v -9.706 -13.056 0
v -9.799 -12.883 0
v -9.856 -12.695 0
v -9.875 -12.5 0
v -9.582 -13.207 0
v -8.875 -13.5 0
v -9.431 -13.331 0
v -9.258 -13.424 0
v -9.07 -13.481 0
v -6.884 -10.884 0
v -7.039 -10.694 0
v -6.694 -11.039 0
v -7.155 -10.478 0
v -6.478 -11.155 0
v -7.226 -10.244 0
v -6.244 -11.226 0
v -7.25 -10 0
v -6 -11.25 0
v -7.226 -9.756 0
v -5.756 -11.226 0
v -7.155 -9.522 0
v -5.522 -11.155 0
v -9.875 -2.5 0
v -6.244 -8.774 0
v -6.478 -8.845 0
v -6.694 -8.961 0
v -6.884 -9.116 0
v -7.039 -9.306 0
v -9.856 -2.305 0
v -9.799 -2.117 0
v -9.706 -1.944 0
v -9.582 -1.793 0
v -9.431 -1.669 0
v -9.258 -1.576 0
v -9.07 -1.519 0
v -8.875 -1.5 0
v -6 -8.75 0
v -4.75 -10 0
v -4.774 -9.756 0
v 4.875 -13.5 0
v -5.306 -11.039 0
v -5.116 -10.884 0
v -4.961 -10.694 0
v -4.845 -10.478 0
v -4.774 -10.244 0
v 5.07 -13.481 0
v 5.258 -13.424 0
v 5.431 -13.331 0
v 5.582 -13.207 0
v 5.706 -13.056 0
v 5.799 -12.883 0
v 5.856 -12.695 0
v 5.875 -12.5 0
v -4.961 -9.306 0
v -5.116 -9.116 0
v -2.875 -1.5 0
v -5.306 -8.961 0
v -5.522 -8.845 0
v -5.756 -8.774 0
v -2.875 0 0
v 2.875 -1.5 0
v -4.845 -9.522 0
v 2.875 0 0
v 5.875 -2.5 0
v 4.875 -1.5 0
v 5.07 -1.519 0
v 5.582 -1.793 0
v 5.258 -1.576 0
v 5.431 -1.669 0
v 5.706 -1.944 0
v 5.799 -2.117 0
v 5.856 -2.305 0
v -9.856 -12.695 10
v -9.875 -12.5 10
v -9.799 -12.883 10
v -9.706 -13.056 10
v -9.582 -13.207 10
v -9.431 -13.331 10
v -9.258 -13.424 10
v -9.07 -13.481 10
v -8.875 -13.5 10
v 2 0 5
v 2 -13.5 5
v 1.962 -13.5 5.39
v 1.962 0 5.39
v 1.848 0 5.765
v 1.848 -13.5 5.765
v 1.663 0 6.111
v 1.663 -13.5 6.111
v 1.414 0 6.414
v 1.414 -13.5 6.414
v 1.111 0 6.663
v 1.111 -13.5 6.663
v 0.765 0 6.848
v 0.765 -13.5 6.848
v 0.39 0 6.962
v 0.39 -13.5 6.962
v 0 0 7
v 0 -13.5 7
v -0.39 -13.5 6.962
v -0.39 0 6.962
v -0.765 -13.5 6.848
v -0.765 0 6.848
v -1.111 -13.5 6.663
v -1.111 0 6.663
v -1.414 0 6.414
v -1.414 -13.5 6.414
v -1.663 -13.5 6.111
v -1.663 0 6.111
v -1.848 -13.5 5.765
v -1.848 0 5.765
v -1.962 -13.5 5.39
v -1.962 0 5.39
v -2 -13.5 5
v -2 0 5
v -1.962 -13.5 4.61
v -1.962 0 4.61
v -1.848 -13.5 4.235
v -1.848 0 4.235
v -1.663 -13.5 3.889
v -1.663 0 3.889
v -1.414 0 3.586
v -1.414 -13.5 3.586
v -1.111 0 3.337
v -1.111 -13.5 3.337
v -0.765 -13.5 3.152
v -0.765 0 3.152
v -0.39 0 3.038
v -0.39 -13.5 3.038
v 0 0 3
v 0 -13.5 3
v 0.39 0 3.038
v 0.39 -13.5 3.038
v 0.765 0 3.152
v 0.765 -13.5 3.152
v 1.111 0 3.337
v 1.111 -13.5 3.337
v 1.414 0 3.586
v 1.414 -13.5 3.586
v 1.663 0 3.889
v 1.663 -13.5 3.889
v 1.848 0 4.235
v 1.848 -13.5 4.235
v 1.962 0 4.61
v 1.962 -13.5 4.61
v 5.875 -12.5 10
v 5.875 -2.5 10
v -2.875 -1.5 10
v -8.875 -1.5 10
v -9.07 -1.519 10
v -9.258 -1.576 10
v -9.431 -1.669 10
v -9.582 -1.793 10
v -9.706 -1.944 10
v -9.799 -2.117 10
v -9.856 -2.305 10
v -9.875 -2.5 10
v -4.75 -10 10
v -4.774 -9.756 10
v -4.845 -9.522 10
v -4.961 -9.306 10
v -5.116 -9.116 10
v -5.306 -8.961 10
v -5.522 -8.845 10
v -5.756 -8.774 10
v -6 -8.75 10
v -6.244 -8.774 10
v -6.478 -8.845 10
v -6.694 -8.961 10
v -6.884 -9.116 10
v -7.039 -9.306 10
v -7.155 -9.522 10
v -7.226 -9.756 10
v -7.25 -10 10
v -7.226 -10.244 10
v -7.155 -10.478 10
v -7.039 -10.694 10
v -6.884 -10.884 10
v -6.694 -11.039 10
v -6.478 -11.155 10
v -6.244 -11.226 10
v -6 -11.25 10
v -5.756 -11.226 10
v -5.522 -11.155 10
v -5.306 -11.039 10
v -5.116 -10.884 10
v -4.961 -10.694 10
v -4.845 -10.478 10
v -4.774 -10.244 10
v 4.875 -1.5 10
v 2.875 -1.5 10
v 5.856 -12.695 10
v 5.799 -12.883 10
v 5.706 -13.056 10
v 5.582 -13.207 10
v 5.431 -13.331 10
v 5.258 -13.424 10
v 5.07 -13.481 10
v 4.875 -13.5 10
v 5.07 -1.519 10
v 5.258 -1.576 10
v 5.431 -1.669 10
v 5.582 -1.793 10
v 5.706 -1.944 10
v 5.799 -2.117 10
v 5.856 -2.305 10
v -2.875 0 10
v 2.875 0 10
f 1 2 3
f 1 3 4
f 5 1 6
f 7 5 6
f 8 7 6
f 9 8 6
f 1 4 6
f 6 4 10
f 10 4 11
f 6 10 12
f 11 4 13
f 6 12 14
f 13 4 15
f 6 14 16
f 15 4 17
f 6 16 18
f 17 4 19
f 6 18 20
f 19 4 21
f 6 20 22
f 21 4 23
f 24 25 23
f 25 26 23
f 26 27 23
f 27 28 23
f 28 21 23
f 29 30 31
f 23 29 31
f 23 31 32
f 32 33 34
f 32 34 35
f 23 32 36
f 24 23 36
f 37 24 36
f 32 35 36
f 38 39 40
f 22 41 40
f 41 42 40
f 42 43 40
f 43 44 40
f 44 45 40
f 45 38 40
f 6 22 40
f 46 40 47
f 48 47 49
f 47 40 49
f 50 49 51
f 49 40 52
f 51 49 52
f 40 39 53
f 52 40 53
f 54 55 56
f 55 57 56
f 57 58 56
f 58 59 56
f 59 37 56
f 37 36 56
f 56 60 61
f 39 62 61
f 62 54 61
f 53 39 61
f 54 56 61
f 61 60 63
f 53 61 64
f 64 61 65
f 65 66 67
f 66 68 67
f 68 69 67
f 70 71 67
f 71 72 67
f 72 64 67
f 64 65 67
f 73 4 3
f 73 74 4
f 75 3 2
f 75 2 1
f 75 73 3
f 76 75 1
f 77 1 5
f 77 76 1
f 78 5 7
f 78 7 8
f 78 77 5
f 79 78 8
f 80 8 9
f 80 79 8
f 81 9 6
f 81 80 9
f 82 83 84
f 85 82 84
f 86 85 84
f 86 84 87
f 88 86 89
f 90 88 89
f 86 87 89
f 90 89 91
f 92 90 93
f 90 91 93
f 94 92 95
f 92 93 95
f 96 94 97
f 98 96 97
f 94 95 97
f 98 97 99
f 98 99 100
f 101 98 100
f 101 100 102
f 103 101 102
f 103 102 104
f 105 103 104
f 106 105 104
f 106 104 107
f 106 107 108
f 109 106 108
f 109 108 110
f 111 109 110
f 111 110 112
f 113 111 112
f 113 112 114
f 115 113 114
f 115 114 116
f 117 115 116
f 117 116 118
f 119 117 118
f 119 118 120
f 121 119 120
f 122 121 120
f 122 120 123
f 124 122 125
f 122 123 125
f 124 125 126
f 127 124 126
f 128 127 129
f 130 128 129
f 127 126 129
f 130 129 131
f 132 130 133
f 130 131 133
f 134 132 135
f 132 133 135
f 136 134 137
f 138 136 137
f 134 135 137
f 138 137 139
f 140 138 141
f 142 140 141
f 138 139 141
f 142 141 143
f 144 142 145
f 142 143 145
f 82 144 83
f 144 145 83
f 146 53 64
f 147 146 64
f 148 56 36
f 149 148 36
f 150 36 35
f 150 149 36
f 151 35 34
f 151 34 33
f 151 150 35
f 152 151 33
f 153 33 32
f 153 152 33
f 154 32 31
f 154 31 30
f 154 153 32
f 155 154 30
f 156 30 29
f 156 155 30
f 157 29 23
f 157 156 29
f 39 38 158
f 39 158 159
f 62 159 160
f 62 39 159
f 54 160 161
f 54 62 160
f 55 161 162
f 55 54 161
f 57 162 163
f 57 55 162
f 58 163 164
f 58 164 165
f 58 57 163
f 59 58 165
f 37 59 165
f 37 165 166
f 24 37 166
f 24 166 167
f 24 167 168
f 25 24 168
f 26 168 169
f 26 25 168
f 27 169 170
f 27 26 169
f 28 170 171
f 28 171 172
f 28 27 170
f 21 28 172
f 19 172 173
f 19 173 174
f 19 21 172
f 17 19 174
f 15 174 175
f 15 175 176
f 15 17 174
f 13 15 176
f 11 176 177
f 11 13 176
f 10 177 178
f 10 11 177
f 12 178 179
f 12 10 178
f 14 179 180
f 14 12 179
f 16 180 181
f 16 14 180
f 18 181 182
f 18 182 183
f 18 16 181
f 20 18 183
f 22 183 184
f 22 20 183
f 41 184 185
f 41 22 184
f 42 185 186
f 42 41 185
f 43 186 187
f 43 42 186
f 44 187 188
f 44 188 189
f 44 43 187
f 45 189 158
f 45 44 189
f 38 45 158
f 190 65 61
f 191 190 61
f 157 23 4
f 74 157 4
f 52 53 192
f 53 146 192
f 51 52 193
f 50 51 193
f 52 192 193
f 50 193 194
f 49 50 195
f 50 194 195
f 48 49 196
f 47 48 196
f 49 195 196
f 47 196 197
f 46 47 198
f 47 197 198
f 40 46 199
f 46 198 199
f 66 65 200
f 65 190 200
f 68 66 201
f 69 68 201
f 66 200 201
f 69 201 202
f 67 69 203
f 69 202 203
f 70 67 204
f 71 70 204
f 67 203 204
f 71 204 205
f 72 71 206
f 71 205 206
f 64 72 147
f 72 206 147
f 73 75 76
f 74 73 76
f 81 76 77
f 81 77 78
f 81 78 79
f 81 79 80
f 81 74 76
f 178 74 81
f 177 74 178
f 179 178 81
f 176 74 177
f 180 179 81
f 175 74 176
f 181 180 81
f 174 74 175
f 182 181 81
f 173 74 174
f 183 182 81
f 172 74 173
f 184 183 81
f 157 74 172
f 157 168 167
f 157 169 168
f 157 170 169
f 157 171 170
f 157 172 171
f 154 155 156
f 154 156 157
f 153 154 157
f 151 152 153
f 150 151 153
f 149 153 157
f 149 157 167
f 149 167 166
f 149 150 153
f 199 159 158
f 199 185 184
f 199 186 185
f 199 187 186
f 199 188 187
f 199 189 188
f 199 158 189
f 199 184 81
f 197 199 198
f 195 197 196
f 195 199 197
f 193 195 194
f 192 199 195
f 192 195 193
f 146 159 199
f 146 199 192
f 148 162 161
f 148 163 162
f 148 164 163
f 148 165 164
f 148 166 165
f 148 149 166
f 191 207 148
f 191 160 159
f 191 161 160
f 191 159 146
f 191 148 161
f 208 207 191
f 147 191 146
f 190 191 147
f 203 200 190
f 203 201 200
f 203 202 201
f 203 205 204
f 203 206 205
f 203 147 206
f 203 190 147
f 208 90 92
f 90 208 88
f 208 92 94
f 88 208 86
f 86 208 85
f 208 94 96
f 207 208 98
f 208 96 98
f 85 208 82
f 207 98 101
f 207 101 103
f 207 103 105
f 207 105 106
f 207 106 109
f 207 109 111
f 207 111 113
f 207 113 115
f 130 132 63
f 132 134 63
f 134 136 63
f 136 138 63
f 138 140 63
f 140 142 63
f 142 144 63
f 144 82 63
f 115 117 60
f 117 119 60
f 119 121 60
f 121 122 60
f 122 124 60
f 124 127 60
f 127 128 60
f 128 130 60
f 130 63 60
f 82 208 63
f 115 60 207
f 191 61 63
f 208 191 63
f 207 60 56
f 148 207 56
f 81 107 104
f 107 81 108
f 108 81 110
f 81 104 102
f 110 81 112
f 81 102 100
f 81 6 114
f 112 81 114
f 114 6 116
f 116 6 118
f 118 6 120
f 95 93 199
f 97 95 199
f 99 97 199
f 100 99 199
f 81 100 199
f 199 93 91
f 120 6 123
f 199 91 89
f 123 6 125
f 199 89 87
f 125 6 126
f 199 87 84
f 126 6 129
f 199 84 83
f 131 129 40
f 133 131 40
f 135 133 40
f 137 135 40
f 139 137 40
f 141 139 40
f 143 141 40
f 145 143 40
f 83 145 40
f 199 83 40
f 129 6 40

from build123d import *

# Parameters (mm, degrees)
F0_R     = 1.25
F1_DEPTH = 10
F2_R     = 2
F3_DEPTH = 13.501
F4_R     = 1


# Not quite as in the source:
# - a feature names something its author has since deleted; it is built from what else it names


with BuildPart() as f1:
    # F0 (on Top) → F1 (new body)
    with BuildSketch(Plane.XY):
        Polygon((2.875, 0), (-2.875, 0), (-2.875, -1.5), (-9.875, -1.5), (-9.875, -13.5), (5.875, -13.5), (5.875, -1.5), (2.875, -1.5), align=None)
        with Locations((-6, -10)):
            Circle(F0_R, mode=Mode.SUBTRACT)
    extrude(amount=F1_DEPTH)

    # F2 (on face) → F3 (cut, through all)
    with BuildSketch(Plane.XZ.offset(13.5)):
        with Locations((0, 5)):
            Circle(F2_R)
    extrude(amount=-F3_DEPTH, mode=Mode.SUBTRACT)

    # F4
    f4_edges = [f1.edges().sort_by_distance(p)[0] for p in [
        (5.875, -1.5, 5),
        (5.875, -13.5, 5),
        (-9.875, -1.5, 5),
        (-9.875, -13.5, 5),
    ]]
    fillet(f4_edges, radius=F4_R)


solid = f1.part
